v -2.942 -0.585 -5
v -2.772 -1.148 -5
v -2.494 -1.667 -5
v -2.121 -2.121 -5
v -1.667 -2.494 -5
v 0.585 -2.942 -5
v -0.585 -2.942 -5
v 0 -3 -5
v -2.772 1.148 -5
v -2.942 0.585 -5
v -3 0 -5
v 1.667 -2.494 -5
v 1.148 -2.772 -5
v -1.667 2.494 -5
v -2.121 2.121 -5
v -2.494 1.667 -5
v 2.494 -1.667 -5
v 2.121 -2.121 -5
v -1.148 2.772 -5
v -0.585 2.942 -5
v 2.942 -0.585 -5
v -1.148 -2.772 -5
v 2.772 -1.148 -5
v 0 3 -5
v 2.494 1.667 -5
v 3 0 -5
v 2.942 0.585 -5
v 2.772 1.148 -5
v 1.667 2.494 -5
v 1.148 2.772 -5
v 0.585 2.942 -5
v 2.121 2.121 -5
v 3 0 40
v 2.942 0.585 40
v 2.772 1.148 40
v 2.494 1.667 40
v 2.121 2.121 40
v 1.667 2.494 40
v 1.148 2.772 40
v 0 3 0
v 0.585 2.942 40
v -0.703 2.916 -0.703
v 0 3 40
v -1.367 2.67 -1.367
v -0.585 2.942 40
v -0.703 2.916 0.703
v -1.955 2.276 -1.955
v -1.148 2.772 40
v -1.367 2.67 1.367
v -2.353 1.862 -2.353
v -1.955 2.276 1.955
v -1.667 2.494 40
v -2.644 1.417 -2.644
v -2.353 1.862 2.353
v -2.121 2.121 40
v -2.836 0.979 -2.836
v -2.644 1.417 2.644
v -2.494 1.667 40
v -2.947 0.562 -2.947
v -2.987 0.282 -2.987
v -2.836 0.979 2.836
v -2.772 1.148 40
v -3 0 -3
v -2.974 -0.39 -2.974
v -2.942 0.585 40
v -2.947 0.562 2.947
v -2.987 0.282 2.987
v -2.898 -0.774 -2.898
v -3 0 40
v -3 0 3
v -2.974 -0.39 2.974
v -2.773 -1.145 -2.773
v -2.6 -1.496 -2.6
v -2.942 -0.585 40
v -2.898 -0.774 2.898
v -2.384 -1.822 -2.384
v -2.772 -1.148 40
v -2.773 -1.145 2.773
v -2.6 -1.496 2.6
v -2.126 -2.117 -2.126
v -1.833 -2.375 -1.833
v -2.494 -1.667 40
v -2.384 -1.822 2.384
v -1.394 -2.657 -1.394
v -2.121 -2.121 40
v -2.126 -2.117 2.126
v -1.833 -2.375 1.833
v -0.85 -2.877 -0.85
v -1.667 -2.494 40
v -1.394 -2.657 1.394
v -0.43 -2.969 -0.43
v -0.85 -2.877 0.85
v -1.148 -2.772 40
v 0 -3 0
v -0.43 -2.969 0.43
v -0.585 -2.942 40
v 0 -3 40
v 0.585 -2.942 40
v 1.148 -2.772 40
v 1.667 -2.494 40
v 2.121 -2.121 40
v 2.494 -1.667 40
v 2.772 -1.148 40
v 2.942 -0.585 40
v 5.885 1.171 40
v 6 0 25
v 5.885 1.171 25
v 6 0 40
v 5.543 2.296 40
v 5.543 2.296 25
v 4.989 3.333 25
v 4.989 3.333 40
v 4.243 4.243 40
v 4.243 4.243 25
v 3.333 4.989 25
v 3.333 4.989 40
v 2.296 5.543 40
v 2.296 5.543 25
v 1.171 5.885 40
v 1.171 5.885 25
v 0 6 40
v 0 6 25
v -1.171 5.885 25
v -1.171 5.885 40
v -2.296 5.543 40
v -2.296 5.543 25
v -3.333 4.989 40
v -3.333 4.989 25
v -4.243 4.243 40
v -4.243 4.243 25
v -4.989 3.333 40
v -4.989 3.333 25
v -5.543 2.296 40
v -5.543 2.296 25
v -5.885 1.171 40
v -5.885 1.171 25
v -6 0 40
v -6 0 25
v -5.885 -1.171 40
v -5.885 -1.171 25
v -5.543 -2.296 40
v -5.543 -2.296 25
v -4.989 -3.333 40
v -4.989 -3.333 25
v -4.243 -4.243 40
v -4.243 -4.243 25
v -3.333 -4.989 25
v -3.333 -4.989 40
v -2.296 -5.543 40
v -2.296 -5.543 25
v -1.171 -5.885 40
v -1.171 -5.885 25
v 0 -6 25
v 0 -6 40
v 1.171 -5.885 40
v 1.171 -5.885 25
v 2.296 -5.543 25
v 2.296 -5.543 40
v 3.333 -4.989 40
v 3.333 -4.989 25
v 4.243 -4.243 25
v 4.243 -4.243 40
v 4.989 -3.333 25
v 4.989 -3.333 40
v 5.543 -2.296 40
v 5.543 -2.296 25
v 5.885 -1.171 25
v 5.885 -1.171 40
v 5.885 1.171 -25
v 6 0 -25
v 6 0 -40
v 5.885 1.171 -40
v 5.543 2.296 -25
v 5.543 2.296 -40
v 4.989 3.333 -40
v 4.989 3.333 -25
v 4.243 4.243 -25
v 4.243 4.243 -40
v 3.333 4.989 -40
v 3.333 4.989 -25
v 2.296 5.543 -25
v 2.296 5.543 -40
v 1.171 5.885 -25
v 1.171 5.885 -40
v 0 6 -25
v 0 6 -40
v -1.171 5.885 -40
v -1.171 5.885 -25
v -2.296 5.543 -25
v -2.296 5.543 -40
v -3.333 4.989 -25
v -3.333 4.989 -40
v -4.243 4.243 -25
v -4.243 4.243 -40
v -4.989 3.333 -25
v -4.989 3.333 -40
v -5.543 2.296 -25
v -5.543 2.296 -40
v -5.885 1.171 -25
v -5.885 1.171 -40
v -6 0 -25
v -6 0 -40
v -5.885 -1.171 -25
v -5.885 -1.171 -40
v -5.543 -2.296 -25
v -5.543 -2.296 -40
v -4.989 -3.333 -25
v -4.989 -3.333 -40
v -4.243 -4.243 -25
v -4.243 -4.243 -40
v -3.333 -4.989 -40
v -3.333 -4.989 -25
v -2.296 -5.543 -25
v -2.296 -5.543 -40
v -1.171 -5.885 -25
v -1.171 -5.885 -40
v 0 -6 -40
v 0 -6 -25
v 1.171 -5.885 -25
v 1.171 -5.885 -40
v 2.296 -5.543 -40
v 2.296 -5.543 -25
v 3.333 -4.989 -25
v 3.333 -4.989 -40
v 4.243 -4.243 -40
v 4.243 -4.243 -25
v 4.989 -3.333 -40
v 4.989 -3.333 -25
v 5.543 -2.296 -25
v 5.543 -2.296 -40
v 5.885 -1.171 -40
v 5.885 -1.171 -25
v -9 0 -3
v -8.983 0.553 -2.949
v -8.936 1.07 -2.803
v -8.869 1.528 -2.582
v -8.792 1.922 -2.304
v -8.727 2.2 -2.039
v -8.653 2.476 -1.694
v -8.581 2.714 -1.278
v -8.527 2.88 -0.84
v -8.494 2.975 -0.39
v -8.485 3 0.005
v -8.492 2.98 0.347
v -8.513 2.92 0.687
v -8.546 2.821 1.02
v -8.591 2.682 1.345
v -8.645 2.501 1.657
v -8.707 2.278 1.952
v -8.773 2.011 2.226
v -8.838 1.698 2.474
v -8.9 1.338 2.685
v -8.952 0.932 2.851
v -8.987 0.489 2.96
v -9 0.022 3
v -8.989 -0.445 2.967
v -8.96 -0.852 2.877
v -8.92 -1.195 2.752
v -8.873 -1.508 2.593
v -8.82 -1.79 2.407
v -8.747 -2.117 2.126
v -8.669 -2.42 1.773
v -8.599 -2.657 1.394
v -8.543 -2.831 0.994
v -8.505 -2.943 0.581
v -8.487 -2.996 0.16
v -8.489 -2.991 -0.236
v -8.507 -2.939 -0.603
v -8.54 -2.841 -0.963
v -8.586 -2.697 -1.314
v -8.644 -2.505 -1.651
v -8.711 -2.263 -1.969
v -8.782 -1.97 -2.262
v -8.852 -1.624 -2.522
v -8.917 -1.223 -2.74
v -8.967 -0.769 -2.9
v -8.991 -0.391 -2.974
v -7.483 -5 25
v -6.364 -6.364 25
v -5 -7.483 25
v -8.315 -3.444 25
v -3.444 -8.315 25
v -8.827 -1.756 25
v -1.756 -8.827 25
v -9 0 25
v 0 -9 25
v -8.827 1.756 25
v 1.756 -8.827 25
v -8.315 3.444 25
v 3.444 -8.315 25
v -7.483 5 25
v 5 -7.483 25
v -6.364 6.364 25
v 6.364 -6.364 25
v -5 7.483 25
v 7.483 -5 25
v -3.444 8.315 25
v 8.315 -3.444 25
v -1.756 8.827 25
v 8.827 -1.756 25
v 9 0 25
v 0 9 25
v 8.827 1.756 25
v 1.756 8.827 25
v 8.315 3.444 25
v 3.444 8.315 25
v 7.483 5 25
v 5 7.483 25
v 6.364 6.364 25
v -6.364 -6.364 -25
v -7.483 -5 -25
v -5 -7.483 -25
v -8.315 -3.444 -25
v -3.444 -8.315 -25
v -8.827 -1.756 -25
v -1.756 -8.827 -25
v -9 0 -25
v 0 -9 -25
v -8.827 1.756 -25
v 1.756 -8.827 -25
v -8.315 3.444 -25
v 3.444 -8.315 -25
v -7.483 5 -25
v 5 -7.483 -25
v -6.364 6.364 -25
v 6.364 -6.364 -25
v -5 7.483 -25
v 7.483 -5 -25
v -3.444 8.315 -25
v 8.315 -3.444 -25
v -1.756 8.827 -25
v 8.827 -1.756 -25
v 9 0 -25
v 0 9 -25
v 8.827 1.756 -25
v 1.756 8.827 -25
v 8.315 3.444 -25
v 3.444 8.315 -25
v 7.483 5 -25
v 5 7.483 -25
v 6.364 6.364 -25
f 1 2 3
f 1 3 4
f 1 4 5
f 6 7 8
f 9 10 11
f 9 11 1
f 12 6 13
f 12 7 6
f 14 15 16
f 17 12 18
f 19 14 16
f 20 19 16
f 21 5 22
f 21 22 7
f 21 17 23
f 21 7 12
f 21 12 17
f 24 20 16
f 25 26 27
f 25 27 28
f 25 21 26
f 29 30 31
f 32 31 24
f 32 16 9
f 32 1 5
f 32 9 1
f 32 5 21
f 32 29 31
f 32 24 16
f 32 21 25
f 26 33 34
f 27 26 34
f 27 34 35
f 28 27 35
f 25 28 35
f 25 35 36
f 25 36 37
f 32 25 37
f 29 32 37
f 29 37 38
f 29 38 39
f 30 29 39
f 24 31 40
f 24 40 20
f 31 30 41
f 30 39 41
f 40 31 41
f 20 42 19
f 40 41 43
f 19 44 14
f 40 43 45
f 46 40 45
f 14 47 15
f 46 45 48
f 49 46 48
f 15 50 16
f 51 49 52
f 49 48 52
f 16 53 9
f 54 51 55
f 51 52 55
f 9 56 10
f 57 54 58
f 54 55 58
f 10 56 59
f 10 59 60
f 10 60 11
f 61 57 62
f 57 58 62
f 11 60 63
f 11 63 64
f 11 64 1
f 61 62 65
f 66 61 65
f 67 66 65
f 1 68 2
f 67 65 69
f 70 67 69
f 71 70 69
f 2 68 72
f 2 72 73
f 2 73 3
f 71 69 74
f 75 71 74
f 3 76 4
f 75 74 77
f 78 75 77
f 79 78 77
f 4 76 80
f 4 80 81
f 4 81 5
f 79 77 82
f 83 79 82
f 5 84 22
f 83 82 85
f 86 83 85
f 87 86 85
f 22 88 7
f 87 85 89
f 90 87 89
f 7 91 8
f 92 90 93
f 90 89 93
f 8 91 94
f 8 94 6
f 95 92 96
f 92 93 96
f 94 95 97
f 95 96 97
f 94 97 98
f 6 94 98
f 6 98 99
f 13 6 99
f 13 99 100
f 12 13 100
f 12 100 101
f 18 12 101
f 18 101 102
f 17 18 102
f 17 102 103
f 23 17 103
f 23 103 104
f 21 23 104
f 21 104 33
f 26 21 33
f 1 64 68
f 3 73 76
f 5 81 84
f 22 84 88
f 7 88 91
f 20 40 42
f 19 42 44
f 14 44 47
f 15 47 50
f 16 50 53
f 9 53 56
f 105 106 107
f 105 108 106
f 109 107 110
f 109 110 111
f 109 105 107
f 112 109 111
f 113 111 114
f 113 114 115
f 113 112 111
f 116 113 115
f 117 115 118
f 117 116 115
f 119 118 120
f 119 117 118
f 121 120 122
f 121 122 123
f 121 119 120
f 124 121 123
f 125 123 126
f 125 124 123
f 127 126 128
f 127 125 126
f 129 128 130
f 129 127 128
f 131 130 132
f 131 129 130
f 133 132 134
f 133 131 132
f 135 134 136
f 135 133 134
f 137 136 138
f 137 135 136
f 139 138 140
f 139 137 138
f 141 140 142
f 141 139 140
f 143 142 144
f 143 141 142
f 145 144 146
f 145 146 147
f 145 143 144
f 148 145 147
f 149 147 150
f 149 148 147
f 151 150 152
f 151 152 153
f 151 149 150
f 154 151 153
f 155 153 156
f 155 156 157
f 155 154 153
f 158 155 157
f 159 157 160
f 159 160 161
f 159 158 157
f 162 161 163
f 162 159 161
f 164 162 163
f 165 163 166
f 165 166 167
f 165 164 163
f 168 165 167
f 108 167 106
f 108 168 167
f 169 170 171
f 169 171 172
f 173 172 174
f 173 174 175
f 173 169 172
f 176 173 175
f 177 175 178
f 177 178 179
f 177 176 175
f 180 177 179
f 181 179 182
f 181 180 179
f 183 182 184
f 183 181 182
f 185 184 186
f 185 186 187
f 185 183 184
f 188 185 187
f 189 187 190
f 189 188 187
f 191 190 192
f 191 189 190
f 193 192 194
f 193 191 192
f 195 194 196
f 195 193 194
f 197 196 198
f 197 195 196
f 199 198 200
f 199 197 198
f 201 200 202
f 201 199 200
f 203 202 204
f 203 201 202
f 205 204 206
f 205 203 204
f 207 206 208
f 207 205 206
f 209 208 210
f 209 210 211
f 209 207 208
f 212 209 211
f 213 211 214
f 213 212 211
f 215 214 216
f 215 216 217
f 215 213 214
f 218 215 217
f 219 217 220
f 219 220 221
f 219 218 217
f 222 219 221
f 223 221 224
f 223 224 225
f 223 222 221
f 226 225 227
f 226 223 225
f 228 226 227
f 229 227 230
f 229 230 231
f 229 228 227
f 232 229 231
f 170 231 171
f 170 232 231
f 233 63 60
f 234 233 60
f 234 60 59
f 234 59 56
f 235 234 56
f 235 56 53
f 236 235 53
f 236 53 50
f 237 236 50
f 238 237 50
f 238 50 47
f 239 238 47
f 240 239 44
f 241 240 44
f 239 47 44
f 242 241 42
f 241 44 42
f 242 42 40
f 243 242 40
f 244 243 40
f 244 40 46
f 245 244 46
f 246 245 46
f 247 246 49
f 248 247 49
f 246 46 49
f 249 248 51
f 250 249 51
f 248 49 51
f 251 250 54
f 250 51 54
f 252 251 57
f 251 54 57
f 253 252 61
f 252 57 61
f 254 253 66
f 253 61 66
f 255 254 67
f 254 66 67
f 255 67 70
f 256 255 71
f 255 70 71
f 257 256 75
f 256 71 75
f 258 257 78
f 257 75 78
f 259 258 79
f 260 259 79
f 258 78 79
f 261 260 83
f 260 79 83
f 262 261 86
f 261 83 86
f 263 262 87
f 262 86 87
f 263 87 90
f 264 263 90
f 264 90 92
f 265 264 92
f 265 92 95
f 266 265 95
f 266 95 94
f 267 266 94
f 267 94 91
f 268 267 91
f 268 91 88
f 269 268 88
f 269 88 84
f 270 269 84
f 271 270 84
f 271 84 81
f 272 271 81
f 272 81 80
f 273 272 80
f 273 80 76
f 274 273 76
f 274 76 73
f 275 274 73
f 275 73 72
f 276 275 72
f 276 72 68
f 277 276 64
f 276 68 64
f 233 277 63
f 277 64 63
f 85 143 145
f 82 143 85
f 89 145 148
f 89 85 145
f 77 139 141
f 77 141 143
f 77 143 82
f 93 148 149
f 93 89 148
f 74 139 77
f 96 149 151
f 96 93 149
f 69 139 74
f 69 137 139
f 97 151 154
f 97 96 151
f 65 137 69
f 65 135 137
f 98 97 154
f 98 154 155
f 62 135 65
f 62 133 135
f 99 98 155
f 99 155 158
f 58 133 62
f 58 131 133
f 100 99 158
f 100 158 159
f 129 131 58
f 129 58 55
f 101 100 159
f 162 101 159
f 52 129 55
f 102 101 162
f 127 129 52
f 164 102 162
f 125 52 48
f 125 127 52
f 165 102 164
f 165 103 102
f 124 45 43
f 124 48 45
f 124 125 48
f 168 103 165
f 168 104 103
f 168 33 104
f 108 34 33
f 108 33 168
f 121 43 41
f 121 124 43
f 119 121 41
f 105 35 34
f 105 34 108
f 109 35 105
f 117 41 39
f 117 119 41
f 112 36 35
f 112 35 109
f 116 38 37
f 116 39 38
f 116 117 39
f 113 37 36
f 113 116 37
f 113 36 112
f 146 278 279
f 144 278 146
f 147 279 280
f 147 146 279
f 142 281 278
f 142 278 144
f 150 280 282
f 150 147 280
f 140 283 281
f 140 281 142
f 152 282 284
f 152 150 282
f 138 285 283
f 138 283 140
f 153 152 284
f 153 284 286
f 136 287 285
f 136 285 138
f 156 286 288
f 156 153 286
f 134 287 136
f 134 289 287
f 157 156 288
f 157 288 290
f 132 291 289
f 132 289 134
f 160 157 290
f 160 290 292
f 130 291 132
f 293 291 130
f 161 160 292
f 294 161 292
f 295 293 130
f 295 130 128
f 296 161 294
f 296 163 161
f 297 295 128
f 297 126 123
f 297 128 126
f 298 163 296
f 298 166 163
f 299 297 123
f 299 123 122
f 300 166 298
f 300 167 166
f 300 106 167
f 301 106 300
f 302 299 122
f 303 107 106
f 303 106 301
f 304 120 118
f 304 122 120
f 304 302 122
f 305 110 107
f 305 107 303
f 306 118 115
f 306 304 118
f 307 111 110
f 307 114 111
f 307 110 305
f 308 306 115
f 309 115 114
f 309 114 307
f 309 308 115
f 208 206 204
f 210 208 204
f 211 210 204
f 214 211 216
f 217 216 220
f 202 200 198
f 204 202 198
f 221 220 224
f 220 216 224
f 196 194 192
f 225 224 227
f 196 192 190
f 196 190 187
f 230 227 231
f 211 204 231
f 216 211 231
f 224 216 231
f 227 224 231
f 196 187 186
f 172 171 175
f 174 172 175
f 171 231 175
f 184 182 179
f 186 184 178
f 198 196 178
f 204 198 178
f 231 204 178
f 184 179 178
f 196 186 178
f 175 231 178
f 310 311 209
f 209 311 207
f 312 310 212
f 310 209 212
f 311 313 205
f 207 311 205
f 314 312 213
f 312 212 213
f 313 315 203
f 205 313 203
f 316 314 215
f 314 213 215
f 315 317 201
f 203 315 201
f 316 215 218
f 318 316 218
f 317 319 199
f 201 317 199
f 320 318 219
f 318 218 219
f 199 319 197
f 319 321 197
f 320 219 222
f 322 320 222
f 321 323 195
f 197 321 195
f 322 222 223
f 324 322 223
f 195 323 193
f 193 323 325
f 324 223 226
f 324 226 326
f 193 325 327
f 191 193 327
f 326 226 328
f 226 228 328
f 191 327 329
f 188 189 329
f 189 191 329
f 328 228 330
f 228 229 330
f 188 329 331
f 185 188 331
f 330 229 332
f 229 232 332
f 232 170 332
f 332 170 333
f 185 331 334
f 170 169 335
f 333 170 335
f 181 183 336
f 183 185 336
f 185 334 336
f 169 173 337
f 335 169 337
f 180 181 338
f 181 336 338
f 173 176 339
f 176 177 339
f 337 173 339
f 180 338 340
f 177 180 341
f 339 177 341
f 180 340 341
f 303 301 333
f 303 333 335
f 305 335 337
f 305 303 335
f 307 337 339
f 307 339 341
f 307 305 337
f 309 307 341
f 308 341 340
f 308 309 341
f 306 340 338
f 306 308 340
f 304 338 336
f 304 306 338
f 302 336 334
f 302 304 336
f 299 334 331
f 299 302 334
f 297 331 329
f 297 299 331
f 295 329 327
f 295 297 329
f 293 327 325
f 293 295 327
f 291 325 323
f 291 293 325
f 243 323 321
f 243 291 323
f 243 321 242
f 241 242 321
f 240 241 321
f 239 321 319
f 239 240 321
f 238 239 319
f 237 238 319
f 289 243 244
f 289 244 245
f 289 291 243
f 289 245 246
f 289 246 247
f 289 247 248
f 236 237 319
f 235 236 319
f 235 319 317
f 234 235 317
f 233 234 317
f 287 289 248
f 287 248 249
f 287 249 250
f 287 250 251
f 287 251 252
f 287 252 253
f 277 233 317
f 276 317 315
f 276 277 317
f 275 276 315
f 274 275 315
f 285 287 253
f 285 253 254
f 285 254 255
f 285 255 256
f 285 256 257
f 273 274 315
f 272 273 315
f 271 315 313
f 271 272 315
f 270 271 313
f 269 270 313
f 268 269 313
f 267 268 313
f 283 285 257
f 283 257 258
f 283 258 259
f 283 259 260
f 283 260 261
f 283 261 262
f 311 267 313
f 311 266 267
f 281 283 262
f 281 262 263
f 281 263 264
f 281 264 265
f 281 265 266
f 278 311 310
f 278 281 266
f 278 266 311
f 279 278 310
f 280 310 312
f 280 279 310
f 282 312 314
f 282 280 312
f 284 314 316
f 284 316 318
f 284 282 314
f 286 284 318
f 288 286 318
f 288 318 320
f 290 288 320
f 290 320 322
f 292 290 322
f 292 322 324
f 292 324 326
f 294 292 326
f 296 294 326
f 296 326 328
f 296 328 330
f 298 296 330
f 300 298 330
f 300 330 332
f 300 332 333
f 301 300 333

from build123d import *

# Parameters (mm, degrees)
SKETCH1_R           = 6
BOSS_EXTRUDE1_DEPTH = 40
SKETCH2_R           = 9
BOSS_EXTRUDE2_DEPTH = 25
SKETCH4_R           = 3
CUT_EXTRUDE1_DEPTH  = 45
SKETCH6_R           = 3
CUT_EXTRUDE2_DEPTH  = 10


with BuildPart() as part:
    # Sketch1 → Boss-Extrude1 (new body, symmetric)
    with BuildSketch(Plane.XY):
        Circle(SKETCH1_R)
    extrude(amount=BOSS_EXTRUDE1_DEPTH, both=True)

    # Sketch2 → Boss-Extrude2 (add, symmetric)
    with BuildSketch(Plane.XY):
        Circle(SKETCH2_R)
    extrude(amount=BOSS_EXTRUDE2_DEPTH, both=True)

    # Sketch4 → Cut-Extrude1 (cut)
    with BuildSketch(Plane.XY.offset(40)):
        Circle(SKETCH4_R)
    extrude(amount=-CUT_EXTRUDE1_DEPTH, mode=Mode.SUBTRACT)

    # Sketch6 → Cut-Extrude2 (cut, through all)
    with BuildSketch(Plane(origin=(0, 0, 0), x_dir=(0, 0, -1), z_dir=(1, 0, 0))):
        Circle(SKETCH6_R)
    extrude(amount=-CUT_EXTRUDE2_DEPTH, mode=Mode.SUBTRACT)


solid = part.part
